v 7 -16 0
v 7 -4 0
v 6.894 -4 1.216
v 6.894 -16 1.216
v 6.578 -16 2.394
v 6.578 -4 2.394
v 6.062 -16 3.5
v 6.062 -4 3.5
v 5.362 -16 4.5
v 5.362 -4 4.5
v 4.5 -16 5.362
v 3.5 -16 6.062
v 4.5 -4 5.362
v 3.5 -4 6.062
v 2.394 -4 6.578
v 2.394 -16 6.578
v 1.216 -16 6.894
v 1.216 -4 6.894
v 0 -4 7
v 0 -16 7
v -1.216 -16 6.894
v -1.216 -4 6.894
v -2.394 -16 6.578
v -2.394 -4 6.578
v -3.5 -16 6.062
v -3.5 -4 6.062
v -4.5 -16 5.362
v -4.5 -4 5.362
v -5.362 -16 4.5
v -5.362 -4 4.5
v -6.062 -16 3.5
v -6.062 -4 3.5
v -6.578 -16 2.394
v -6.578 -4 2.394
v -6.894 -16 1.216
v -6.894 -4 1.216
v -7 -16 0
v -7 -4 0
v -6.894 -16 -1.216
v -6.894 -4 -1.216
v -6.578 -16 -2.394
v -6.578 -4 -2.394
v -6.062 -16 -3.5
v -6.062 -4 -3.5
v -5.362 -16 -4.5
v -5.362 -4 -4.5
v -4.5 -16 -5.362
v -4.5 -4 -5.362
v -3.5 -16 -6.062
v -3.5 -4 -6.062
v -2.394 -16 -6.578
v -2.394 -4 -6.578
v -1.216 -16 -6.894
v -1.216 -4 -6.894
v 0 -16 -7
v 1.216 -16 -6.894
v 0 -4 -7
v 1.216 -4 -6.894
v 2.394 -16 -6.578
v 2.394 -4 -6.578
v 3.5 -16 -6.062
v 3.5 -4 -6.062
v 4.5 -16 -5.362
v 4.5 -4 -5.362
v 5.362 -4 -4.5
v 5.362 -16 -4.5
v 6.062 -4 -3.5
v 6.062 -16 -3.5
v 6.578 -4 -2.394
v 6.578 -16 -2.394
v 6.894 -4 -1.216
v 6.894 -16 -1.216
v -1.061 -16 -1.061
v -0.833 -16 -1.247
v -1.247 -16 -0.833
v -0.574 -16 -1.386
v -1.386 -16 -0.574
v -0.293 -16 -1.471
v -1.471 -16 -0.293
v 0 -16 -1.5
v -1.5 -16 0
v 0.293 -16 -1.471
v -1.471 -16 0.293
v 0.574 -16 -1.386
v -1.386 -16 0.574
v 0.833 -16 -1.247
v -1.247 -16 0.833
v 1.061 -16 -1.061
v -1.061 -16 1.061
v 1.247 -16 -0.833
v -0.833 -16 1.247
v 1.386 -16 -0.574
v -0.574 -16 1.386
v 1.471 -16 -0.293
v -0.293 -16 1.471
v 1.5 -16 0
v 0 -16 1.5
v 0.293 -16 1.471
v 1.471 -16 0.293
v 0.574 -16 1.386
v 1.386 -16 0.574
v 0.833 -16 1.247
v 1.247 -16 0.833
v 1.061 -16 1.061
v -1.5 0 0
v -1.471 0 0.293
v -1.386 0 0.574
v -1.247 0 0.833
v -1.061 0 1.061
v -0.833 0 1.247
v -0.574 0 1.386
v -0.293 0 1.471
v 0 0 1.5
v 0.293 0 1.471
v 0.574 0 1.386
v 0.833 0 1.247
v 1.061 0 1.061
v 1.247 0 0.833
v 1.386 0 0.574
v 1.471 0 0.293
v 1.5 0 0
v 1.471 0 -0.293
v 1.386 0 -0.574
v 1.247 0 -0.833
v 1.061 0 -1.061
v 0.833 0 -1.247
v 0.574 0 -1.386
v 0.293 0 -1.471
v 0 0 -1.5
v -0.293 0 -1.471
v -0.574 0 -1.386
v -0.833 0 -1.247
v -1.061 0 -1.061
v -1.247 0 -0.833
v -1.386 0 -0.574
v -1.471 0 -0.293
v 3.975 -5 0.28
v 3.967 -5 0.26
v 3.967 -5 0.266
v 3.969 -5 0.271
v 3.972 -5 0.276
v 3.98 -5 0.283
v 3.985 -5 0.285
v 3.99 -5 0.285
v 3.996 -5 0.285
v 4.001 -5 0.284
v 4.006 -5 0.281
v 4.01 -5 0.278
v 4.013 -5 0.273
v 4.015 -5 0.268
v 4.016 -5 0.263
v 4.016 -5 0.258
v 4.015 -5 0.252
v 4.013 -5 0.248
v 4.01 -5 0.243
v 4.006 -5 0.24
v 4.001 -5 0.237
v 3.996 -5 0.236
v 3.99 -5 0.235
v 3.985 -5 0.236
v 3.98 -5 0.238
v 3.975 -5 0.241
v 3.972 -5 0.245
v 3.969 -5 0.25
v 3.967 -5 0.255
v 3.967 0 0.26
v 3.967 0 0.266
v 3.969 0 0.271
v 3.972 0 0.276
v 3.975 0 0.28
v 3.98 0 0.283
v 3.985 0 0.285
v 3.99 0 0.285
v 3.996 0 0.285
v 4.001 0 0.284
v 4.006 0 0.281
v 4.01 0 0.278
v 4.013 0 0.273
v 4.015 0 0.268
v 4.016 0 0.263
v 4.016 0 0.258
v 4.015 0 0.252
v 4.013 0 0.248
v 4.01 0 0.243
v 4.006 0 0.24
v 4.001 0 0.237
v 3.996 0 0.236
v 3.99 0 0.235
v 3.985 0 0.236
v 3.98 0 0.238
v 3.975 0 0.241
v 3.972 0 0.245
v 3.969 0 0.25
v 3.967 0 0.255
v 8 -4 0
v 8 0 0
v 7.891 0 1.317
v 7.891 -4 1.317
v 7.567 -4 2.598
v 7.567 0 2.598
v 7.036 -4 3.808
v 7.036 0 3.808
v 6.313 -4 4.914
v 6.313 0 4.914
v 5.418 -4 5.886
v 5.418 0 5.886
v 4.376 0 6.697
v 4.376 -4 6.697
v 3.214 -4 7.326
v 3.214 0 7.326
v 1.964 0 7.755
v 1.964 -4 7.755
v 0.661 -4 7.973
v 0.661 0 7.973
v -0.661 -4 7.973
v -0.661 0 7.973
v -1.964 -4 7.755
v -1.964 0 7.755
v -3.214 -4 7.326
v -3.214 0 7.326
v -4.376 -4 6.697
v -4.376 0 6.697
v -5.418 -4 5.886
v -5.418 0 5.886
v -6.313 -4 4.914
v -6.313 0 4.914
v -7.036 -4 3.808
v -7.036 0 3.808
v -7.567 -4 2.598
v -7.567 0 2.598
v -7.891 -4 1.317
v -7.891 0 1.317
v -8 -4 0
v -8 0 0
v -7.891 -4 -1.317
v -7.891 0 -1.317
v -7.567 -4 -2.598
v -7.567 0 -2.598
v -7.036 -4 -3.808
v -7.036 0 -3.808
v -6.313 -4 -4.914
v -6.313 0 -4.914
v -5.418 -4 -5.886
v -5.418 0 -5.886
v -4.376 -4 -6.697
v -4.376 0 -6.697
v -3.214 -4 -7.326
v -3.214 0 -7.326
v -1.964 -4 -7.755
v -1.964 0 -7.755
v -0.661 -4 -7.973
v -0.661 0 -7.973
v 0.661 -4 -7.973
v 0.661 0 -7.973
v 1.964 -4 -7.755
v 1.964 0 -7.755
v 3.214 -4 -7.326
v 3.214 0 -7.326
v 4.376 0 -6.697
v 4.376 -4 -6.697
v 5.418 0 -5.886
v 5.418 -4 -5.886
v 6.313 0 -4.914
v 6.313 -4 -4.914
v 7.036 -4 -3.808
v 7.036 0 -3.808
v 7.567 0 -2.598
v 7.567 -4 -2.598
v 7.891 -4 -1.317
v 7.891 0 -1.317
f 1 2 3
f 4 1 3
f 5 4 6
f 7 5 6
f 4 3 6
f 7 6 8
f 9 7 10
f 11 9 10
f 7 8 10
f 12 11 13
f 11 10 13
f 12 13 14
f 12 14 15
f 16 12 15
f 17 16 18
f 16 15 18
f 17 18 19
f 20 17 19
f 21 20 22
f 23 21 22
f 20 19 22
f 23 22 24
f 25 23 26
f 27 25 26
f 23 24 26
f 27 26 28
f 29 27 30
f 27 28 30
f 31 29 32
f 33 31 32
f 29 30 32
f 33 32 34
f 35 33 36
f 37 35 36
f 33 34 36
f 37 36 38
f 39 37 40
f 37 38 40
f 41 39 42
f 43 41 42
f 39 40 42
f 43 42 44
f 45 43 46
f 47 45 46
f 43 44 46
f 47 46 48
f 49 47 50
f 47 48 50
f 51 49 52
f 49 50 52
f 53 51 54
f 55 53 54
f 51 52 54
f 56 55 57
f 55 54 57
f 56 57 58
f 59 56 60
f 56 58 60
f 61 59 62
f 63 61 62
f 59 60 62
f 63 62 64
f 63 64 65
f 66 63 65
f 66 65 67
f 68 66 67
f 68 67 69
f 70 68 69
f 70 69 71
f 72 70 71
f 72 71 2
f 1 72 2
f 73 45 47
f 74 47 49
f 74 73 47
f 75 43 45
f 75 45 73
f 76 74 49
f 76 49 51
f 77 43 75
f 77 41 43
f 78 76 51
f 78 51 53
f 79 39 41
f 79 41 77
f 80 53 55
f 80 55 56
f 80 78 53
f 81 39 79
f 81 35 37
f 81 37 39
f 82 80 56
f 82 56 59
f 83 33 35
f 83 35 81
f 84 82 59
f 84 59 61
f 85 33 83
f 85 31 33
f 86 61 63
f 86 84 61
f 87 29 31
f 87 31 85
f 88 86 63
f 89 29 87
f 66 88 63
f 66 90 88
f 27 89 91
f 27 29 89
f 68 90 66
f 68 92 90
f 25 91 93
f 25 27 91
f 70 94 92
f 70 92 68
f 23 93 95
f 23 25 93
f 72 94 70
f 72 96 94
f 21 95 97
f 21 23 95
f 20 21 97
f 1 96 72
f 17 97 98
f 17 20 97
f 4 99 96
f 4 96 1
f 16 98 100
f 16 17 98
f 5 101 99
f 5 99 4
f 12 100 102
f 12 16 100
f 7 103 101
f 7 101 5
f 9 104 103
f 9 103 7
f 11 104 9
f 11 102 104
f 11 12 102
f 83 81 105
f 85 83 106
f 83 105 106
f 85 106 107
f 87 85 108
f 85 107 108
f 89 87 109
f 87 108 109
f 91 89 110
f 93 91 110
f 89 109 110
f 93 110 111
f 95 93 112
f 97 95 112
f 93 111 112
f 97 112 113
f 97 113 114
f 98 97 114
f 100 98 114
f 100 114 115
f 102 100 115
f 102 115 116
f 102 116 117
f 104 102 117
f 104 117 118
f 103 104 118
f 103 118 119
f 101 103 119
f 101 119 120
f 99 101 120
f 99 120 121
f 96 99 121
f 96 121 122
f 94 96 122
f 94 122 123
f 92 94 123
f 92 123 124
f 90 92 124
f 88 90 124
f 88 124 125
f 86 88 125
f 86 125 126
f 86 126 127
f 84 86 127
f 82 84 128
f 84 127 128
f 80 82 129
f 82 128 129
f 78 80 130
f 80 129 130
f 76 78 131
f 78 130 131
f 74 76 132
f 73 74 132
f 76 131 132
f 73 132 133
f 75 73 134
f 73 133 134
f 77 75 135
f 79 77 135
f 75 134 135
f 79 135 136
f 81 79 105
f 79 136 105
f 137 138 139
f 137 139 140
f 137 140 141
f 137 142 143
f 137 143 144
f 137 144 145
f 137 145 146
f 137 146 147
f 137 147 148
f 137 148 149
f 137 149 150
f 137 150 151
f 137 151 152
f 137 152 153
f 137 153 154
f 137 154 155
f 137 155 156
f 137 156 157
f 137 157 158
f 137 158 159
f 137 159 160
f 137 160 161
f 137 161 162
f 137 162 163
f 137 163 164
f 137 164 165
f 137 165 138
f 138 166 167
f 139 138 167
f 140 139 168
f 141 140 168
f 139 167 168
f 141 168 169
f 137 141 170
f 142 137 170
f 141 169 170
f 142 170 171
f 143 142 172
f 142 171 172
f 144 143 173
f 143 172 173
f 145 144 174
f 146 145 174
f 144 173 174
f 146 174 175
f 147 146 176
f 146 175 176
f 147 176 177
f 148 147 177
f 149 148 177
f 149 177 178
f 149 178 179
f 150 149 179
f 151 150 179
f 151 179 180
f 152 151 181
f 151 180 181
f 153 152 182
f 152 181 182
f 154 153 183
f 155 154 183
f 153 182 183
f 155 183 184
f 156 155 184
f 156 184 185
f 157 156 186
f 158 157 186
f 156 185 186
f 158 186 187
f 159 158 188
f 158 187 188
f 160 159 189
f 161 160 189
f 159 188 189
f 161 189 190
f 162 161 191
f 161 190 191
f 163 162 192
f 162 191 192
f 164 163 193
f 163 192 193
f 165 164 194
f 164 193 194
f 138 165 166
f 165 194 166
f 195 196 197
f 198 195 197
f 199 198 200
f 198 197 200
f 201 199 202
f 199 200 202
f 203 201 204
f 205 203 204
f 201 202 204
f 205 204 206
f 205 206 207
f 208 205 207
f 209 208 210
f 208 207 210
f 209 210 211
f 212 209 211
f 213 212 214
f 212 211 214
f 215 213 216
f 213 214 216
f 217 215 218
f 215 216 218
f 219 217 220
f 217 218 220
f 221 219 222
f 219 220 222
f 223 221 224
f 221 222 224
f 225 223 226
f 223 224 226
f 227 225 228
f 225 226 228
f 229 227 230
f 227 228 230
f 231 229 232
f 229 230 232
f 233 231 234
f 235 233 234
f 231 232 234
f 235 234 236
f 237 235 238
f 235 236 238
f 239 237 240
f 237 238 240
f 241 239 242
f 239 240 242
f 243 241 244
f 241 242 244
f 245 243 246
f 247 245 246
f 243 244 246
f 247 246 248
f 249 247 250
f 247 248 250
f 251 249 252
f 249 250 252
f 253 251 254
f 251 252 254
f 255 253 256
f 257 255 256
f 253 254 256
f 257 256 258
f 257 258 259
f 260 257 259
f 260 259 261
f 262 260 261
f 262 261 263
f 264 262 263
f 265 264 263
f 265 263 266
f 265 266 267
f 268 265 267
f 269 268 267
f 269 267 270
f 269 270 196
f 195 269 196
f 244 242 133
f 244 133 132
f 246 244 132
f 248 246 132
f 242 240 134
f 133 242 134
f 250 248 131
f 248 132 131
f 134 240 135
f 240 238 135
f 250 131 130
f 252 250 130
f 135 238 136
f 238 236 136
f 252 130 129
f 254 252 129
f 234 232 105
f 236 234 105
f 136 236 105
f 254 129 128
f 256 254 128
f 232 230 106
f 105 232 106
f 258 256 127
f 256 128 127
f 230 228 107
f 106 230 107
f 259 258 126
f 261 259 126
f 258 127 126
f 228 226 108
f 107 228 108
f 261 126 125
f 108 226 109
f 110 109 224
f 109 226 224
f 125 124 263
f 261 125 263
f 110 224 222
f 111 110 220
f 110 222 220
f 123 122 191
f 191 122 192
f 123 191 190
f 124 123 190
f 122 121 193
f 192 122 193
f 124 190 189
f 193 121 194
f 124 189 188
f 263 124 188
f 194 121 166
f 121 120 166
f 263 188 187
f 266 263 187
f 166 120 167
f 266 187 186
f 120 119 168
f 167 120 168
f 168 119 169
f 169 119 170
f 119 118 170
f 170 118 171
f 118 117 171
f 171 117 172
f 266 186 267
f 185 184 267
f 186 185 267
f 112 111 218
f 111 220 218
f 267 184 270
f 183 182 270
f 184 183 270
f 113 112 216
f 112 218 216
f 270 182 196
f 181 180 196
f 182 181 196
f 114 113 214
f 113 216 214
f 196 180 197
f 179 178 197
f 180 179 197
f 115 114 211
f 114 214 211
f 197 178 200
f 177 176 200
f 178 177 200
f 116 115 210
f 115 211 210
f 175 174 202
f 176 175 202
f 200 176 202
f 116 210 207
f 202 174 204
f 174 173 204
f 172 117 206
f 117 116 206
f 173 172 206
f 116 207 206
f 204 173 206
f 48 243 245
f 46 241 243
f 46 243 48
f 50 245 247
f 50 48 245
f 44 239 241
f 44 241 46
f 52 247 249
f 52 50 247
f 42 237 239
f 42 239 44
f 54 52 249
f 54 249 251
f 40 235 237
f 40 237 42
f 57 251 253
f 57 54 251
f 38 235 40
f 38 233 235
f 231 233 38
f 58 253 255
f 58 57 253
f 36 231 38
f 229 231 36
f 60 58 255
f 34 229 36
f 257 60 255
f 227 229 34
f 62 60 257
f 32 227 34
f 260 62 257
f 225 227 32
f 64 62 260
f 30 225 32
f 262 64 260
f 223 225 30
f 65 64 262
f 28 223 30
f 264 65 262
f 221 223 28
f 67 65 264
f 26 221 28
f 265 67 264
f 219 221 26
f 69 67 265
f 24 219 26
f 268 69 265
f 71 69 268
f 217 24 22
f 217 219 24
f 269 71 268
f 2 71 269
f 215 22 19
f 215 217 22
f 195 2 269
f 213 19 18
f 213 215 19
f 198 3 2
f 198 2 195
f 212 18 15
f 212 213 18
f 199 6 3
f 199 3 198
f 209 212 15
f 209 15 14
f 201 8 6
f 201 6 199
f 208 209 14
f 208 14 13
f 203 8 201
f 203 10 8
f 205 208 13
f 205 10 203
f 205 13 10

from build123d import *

# Parameters (mm, degrees)
F0_R     = 8
F1_DEPTH = 4
F2_R     = 7
F3_DEPTH = 12
F4_R     = 1.5
F5_DEPTH = 16.001
F6_R     = 0.025
F7_DEPTH = 5


with BuildPart() as f1:
    # F0 (on Front) → F1 (new body)
    with BuildSketch(Plane.XZ):
        Circle(F0_R)
    extrude(amount=F1_DEPTH)

    # F2 (on face) → F3 (join)
    with BuildSketch(Plane.XZ.offset(4)):
        Circle(F2_R)
    extrude(amount=F3_DEPTH)

    # F4 (on face) → F5 (cut, through all)
    with BuildSketch(Plane(origin=(0, 0, 0), x_dir=(-1, 0, 0), z_dir=(0, 1, 0))):
        Circle(F4_R)
    extrude(amount=-F5_DEPTH, mode=Mode.SUBTRACT)

    # F6 (on face) → F7 (cut)
    with BuildSketch(Plane(origin=(0, 0, 0), x_dir=(-1, 0, 0), z_dir=(0, 1, 0))):
        with Locations((-3.991511, 0.260457)):
            Circle(F6_R)
    extrude(amount=-F7_DEPTH, mode=Mode.SUBTRACT)


solid = f1.part
